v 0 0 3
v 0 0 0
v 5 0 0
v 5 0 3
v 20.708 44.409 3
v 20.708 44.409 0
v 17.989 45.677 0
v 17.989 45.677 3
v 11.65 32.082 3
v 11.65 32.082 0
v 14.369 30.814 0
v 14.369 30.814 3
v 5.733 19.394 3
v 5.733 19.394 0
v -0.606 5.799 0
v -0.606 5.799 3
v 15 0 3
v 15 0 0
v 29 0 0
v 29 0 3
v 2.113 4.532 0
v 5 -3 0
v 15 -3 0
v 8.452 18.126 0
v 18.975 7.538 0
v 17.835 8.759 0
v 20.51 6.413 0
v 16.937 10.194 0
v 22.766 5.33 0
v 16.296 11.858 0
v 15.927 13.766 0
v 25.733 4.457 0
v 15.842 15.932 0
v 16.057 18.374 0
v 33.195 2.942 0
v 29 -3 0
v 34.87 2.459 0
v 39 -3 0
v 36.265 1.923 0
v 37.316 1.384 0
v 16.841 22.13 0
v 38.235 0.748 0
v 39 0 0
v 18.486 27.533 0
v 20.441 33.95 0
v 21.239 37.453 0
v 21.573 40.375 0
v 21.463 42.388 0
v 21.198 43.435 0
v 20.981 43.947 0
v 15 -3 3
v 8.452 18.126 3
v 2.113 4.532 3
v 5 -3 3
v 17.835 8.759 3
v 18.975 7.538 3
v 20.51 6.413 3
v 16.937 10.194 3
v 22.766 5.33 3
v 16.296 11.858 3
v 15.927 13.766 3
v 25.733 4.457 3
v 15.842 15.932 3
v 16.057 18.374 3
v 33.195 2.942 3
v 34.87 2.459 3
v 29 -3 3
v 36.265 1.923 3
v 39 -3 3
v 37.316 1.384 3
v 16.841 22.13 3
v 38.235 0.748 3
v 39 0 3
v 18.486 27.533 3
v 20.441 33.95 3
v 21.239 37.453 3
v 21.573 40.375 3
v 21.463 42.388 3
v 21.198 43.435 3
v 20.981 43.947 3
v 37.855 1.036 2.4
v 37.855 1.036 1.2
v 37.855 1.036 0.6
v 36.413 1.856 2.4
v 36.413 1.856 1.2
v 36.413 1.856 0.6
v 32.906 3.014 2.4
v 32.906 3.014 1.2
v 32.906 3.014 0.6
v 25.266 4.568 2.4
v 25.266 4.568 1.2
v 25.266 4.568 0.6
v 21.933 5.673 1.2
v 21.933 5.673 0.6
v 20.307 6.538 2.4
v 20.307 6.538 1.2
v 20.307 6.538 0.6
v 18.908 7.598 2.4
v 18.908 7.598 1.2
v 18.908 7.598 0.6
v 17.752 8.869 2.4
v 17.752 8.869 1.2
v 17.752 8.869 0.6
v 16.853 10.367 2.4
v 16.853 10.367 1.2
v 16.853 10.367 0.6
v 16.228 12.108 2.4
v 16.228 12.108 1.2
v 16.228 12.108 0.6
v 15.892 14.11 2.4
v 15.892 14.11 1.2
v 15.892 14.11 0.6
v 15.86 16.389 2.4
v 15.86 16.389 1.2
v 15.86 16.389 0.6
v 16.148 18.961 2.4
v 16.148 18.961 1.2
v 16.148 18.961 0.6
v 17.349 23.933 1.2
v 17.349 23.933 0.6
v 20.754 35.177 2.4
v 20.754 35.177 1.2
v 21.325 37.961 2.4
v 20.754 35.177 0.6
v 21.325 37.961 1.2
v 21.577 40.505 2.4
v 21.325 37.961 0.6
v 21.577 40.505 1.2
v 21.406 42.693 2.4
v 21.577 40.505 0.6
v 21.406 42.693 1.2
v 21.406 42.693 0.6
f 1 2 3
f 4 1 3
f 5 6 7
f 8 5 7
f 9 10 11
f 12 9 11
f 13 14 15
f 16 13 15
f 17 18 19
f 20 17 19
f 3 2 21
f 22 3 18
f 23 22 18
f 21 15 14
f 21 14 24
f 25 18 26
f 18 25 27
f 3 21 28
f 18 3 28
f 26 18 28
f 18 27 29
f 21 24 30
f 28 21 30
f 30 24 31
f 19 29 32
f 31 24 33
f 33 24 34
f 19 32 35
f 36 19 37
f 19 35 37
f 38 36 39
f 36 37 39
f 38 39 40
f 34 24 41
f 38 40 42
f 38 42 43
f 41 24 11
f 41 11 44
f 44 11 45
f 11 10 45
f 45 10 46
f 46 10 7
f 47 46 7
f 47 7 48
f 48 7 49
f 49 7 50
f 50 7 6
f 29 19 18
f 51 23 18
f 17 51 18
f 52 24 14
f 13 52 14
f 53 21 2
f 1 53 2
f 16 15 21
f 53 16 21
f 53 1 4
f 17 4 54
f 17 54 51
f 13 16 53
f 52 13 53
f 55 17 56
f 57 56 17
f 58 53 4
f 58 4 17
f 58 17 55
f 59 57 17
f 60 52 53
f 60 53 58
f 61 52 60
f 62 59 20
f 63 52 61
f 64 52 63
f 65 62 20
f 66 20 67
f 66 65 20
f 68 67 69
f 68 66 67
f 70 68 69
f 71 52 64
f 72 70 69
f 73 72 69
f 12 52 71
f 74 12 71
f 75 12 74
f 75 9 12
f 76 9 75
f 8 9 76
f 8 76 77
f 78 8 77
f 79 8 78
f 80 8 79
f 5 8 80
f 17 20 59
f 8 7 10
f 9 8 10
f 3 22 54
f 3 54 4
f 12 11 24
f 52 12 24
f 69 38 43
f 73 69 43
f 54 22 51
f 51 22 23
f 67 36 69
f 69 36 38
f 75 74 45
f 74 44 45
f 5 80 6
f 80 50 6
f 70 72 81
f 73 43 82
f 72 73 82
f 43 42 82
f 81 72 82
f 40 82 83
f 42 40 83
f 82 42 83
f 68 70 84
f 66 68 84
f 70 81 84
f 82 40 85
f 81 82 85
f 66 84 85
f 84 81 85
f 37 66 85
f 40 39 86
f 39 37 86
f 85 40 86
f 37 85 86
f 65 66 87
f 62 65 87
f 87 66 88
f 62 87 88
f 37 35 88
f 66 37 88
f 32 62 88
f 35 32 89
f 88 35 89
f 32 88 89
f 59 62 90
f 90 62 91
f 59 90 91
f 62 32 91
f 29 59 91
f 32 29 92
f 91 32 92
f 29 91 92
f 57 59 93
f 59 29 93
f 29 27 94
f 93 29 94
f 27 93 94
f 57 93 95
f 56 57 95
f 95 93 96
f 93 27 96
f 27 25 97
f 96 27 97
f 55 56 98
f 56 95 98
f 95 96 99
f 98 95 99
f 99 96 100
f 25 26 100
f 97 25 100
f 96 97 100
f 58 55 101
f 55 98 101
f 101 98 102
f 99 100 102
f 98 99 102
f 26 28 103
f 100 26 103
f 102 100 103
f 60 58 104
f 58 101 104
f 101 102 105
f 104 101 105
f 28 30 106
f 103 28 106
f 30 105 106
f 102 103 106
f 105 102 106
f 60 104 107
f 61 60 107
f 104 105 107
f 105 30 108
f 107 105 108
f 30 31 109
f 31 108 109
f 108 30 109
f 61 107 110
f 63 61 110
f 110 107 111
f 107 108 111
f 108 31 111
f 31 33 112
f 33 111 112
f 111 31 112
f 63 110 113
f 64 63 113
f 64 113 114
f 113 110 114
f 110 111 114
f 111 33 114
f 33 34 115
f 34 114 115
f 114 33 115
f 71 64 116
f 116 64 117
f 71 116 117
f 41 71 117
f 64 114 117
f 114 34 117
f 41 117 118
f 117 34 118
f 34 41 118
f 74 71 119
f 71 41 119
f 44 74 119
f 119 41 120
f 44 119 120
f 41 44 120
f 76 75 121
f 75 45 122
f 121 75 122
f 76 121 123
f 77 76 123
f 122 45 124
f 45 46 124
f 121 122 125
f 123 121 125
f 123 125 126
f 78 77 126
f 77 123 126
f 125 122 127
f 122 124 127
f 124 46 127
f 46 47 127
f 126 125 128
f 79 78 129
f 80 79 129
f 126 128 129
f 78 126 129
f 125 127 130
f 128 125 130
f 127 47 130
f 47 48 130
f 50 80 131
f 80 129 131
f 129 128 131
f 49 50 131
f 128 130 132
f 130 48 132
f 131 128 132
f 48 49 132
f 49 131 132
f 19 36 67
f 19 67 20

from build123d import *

# Parameters (mm, degrees)
CROQUIS1_W              = 10
CROQUIS1_H              = 3
SALIENTE_EXTRUIR1_DEPTH = 3


with BuildPart() as part:
    # Croquis1 → Saliente-Extruir1 (new body)
    with BuildSketch(Plane.XY):
        with BuildLine():
            add(Edge.make_bspline(
                [(39, 0), (36.40214132, 3.088022609), (28.216098057, 3.51534273), (17.817341549, 6.883397235), (14.464397514, 12.494859187), (18.111199106, 27.508013375), (23.361602612, 40.564262704), (20.708294825, 44.409081565)],
                knots=[0, 0, 0, 0, 0.279353688, 0.353115643, 0.694896896, 0.763857598, 1, 1, 1, 1], degree=3))
            Line((20.708294825, 44.409081565), (14.369020899, 30.814464759))
            Line((14.369020899, 30.814464759), (8.452365235, 18.126155741))
            Line((8.452365235, 18.126155741), (2.113091309, 4.531538935))
            Line((2.113091309, 4.531538935), (0, 0))
            Line((0, 0), (5, 0))
            Line((5, 0), (15, 0))
            Line((15, 0), (29, 0))
            Line((29, 0), (39, 0))
        make_face()
        Polygon((2.113091309, 4.531538935), (8.452365235, 18.126155741), (5.733441874, 19.394010526), (-0.605832052, 5.79939372), align=None)
        Polygon((14.369020899, 30.814464759), (20.708294825, 44.409081565), (17.989371464, 45.67693635), (11.650097538, 32.082319544), align=None)
        with Locations((10, -1.5)):
            Rectangle(CROQUIS1_W, CROQUIS1_H)
        with Locations((34, -1.5)):
            Rectangle(CROQUIS1_W, CROQUIS1_H)
    extrude(amount=SALIENTE_EXTRUIR1_DEPTH)


solid = part.part
